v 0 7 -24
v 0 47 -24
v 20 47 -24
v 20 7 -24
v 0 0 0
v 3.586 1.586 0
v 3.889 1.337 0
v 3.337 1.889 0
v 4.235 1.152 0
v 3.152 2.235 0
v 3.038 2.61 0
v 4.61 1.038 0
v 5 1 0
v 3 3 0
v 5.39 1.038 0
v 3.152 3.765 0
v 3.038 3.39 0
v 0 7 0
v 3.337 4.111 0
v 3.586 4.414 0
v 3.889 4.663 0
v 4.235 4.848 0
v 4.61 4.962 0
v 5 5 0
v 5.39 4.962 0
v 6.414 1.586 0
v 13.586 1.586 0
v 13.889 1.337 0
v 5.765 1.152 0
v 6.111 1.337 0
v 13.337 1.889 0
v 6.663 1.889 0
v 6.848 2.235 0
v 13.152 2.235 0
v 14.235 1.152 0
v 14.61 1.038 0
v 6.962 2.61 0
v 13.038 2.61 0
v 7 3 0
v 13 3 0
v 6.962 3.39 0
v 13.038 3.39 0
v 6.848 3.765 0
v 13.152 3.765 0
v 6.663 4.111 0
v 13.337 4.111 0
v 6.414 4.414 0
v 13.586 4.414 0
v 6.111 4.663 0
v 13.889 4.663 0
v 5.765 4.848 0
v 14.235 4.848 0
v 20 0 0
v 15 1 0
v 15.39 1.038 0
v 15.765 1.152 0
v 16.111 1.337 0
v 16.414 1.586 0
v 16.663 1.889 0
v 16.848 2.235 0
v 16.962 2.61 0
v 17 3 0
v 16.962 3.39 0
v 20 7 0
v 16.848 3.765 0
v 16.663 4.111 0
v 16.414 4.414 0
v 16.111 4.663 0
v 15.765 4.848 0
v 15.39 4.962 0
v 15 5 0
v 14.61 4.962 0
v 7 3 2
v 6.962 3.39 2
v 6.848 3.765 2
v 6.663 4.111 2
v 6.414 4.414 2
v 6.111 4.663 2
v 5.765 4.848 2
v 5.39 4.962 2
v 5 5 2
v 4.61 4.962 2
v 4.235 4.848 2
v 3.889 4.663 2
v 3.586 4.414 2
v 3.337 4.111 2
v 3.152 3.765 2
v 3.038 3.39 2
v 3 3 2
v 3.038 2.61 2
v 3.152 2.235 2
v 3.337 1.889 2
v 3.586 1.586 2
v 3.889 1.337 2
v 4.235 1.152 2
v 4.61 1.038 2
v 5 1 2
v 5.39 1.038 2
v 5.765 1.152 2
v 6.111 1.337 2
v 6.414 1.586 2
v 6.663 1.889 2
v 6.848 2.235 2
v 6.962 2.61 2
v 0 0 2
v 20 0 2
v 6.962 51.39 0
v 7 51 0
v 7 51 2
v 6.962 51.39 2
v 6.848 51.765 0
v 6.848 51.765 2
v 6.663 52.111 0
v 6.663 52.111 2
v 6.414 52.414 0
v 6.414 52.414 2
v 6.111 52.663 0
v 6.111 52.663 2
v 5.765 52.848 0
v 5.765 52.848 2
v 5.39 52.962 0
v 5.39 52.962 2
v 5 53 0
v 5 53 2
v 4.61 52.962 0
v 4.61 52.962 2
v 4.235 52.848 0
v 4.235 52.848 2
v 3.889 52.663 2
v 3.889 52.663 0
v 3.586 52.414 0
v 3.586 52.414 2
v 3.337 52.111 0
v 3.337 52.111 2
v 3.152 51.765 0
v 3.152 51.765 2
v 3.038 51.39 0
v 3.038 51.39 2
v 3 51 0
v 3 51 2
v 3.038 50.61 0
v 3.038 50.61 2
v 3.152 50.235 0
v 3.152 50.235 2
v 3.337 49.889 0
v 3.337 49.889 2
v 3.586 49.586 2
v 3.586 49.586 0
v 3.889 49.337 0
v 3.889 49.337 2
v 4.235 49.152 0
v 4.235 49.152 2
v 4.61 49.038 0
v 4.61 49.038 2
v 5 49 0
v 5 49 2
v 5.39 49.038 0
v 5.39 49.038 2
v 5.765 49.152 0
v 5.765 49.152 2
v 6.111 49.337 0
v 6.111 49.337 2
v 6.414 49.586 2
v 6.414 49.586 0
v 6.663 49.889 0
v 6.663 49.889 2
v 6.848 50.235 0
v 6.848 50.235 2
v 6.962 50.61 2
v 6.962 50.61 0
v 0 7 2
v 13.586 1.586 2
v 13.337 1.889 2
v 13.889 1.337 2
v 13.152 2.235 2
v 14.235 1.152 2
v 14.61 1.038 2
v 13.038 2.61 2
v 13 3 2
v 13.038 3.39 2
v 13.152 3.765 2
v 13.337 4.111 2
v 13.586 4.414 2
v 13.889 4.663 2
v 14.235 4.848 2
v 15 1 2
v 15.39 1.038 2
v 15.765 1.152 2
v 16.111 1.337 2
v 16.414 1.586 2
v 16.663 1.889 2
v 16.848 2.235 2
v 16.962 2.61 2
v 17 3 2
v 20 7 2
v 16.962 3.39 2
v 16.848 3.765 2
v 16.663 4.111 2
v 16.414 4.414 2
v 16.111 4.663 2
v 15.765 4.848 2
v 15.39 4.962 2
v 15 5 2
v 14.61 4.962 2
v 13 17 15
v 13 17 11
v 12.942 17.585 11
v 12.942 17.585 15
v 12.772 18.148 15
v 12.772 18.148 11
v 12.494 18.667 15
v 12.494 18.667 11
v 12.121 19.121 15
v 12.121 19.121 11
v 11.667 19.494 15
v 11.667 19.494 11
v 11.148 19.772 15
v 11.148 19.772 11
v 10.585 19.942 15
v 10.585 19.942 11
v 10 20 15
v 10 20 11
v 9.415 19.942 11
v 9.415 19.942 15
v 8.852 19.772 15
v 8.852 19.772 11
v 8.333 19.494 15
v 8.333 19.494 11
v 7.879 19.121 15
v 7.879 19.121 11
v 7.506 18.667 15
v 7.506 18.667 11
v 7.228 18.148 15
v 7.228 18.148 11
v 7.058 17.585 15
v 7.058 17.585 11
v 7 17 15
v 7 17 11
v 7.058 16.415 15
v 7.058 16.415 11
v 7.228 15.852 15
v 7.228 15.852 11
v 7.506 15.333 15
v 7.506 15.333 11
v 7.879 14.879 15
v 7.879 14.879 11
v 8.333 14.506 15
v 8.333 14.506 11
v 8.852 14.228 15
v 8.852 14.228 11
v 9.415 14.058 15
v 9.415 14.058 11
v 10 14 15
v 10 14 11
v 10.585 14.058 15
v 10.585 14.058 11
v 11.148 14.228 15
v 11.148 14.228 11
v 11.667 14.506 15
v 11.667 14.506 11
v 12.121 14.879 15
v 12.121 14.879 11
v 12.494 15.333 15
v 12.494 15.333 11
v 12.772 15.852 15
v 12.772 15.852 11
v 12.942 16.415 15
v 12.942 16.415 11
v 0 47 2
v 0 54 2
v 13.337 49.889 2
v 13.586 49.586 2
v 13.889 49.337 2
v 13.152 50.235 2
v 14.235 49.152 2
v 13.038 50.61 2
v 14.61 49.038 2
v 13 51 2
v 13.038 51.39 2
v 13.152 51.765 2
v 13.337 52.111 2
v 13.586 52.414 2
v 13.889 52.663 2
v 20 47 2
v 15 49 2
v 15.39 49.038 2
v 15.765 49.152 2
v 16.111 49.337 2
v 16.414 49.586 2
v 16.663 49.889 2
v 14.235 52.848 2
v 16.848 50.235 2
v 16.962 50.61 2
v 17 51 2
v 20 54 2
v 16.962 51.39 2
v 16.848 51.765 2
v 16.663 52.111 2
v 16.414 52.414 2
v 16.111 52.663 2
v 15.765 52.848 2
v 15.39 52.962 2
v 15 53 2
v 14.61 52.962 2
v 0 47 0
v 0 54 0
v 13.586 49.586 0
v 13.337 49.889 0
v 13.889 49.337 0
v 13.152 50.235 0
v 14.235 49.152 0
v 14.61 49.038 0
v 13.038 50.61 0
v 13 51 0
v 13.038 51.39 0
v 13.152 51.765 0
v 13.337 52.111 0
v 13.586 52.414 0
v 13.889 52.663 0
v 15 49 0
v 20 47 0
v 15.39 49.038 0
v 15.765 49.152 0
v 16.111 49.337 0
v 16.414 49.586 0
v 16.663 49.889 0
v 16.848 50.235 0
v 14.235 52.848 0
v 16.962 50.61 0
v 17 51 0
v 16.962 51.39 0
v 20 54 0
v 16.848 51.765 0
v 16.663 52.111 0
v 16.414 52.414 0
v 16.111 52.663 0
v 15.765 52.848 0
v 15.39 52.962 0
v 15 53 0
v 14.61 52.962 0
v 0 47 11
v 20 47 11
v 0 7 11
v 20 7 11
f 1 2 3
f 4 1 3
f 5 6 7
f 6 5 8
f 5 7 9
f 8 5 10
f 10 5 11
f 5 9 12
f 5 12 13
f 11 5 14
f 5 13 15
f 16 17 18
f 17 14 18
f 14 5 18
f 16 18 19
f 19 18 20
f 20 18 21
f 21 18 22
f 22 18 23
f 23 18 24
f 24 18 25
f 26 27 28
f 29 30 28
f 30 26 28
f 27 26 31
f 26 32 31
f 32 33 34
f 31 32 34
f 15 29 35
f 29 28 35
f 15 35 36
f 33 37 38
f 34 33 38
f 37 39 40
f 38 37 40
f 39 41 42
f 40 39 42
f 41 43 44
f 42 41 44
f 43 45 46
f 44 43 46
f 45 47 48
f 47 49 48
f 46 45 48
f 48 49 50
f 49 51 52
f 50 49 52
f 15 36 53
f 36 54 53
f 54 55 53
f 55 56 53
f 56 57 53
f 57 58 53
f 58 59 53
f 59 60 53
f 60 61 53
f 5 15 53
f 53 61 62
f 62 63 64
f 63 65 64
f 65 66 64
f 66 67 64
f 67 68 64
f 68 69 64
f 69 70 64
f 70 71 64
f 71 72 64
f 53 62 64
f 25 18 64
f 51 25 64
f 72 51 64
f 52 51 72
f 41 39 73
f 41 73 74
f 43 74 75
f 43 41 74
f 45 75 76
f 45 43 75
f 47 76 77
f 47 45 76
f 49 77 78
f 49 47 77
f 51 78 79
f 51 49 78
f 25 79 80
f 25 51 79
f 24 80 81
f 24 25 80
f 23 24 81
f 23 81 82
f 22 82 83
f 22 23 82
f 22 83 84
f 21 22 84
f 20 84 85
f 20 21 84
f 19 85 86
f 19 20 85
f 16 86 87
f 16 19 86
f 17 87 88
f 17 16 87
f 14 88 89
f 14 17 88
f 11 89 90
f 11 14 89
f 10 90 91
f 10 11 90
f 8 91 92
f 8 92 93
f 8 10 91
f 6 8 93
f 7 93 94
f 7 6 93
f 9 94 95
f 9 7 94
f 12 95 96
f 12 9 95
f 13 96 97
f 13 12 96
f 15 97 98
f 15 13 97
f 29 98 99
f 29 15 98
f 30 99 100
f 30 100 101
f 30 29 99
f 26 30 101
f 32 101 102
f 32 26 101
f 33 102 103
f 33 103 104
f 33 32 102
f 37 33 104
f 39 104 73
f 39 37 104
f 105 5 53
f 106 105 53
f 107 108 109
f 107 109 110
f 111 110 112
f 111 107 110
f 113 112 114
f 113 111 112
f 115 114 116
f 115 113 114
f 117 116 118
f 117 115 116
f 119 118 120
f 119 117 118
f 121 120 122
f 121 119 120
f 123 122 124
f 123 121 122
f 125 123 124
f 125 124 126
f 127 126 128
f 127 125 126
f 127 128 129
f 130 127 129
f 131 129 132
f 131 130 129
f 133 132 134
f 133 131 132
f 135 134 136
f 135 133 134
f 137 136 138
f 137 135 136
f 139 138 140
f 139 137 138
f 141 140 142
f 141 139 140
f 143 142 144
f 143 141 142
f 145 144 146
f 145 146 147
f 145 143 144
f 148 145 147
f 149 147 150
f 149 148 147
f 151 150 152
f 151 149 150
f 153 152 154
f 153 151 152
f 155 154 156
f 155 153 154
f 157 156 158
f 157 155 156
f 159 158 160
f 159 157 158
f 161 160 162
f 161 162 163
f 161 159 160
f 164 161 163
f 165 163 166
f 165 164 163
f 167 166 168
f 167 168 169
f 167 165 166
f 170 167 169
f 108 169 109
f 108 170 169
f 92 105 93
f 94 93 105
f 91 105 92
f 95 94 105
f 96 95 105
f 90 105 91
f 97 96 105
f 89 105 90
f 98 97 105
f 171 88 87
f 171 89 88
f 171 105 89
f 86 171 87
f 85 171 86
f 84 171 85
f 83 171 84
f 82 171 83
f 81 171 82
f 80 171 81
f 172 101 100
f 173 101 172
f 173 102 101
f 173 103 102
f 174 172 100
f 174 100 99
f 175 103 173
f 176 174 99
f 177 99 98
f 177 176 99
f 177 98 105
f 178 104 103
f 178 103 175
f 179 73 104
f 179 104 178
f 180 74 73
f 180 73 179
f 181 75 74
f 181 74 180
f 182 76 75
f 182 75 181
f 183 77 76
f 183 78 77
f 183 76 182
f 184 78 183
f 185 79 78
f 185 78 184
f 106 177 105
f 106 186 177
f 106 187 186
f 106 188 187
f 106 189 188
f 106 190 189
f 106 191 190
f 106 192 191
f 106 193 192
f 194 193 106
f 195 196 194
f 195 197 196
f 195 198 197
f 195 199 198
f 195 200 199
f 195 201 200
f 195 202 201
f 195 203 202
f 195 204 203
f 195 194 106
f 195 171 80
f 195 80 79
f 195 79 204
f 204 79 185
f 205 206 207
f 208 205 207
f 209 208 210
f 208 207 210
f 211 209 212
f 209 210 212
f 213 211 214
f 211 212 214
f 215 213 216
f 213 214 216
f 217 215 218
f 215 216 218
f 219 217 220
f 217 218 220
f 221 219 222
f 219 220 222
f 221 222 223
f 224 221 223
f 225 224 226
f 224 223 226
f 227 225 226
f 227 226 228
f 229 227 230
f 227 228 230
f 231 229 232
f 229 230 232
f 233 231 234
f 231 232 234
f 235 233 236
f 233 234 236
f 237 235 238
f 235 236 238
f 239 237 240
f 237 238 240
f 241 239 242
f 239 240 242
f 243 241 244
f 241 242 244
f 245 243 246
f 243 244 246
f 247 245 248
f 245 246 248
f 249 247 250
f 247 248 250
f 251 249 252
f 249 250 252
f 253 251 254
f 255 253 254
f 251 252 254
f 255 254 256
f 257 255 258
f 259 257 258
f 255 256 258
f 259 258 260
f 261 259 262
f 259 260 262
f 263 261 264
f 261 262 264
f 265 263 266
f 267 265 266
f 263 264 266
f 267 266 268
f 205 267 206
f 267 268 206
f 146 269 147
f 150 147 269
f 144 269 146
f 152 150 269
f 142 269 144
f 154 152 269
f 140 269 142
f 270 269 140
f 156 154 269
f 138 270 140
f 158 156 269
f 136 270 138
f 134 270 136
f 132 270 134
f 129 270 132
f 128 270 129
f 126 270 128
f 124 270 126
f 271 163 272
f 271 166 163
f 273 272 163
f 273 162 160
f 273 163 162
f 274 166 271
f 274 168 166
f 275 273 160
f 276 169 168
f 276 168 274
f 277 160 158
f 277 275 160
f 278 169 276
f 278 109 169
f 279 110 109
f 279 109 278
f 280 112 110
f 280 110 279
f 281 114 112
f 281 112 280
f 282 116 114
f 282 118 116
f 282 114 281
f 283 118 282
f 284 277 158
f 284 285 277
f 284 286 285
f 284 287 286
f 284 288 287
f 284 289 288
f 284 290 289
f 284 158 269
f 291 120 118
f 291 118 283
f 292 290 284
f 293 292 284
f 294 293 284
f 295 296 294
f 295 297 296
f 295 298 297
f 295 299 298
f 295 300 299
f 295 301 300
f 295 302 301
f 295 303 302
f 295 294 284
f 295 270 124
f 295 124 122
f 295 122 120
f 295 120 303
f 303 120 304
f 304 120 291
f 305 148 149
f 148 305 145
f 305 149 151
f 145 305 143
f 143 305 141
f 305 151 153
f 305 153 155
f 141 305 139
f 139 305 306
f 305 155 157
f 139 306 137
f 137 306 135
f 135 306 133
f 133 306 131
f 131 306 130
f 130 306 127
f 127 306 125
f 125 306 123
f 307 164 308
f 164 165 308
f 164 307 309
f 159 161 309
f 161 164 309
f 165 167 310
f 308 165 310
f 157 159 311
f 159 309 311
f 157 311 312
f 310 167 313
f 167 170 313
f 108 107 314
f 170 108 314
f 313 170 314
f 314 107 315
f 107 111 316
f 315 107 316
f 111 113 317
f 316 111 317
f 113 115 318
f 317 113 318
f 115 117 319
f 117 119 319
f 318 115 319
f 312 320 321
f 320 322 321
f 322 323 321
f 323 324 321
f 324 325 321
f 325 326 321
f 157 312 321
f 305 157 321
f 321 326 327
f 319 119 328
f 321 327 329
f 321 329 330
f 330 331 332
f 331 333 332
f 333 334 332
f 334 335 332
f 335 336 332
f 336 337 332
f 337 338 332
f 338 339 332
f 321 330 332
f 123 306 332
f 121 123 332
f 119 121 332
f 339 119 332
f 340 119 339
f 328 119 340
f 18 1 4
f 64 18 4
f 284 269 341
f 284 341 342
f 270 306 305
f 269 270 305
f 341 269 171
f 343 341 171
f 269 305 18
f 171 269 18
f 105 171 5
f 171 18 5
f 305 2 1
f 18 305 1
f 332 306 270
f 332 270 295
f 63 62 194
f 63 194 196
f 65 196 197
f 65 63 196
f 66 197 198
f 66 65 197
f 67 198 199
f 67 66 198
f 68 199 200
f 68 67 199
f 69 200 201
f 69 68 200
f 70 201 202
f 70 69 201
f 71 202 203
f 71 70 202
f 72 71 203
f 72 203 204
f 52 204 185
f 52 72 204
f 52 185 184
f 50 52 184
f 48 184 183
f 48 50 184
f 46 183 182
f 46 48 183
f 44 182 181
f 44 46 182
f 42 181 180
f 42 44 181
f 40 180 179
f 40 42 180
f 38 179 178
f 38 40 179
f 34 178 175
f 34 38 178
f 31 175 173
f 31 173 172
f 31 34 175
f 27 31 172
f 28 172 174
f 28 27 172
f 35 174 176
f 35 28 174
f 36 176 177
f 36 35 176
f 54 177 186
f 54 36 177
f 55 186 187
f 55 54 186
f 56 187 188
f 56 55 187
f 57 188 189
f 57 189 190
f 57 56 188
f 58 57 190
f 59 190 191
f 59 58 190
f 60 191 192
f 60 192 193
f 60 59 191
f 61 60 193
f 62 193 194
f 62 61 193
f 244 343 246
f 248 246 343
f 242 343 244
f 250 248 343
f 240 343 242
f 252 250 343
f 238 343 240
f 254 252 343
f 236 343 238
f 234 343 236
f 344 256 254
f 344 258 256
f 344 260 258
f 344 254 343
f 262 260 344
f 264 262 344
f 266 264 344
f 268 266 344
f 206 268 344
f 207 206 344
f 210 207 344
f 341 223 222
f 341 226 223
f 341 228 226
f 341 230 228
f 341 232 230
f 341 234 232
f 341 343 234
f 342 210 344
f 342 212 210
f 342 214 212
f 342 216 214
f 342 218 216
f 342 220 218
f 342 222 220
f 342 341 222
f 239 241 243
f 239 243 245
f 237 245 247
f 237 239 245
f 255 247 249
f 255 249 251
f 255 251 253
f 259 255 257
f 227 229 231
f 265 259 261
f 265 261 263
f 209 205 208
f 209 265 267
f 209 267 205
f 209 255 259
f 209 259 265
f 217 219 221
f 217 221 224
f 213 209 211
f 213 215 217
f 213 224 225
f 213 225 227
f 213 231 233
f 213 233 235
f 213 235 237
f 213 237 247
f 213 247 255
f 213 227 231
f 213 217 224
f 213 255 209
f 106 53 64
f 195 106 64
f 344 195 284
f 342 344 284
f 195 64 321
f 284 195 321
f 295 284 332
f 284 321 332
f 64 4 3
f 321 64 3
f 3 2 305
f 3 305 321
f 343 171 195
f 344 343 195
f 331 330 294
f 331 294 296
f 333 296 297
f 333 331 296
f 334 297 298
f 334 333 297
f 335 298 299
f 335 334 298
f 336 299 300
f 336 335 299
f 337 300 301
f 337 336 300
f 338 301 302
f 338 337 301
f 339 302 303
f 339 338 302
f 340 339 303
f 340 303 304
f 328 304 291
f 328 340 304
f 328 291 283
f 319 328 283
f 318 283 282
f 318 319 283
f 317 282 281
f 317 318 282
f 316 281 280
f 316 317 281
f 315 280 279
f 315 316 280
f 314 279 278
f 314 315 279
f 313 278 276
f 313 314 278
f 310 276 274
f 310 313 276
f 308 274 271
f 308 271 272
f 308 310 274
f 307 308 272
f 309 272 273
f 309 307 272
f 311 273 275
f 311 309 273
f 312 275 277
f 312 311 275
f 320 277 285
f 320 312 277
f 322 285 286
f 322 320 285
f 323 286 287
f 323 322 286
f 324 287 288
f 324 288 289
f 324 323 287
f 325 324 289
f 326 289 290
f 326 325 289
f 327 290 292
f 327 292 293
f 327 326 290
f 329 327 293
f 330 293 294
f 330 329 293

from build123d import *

# Parameters (mm, degrees)
F0_W     = 20
F0_H     = 7
F0_R     = 2
F0_H_2   = 40
F1_DEPTH = 2
F2_DEPTH = 11
F3_DEPTH = 24
F4_R     = 3
F5_DEPTH = 4


with BuildPart() as f1:
    # F0 (on Top) → F1 (new body)
    with BuildSketch(Plane.XY):
        with Locations((10, 50.5)):
            Rectangle(F0_W, F0_H)
        with Locations((5, 51)):
            Circle(F0_R, mode=Mode.SUBTRACT)
        with Locations((15, 51)):
            Circle(F0_R, mode=Mode.SUBTRACT)
        with Locations((10, 27)):
            Rectangle(F0_W, F0_H_2)
        with Locations((10, 3.5)):
            Rectangle(F0_W, F0_H)
        with Locations((5, 3)):
            Circle(F0_R, mode=Mode.SUBTRACT)
        with Locations((15, 3)):
            Circle(F0_R, mode=Mode.SUBTRACT)
    extrude(amount=F1_DEPTH)

    # F0 (on Top) → F2 (join)
    with BuildSketch(Plane.XY):
        with Locations((10, 27)):
            Rectangle(F0_W, F0_H_2)
    extrude(amount=F2_DEPTH)

    # F0 (on Top) → F3 (join)
    with BuildSketch(Plane.XY):
        with Locations((10, 27)):
            Rectangle(F0_W, F0_H_2)
    extrude(amount=-F3_DEPTH)

    # F4 (on face) → F5 (join)
    with BuildSketch(Plane.XY.offset(11)):
        with Locations((10, 17)):
            Circle(F4_R)
    extrude(amount=F5_DEPTH)


solid = f1.part
